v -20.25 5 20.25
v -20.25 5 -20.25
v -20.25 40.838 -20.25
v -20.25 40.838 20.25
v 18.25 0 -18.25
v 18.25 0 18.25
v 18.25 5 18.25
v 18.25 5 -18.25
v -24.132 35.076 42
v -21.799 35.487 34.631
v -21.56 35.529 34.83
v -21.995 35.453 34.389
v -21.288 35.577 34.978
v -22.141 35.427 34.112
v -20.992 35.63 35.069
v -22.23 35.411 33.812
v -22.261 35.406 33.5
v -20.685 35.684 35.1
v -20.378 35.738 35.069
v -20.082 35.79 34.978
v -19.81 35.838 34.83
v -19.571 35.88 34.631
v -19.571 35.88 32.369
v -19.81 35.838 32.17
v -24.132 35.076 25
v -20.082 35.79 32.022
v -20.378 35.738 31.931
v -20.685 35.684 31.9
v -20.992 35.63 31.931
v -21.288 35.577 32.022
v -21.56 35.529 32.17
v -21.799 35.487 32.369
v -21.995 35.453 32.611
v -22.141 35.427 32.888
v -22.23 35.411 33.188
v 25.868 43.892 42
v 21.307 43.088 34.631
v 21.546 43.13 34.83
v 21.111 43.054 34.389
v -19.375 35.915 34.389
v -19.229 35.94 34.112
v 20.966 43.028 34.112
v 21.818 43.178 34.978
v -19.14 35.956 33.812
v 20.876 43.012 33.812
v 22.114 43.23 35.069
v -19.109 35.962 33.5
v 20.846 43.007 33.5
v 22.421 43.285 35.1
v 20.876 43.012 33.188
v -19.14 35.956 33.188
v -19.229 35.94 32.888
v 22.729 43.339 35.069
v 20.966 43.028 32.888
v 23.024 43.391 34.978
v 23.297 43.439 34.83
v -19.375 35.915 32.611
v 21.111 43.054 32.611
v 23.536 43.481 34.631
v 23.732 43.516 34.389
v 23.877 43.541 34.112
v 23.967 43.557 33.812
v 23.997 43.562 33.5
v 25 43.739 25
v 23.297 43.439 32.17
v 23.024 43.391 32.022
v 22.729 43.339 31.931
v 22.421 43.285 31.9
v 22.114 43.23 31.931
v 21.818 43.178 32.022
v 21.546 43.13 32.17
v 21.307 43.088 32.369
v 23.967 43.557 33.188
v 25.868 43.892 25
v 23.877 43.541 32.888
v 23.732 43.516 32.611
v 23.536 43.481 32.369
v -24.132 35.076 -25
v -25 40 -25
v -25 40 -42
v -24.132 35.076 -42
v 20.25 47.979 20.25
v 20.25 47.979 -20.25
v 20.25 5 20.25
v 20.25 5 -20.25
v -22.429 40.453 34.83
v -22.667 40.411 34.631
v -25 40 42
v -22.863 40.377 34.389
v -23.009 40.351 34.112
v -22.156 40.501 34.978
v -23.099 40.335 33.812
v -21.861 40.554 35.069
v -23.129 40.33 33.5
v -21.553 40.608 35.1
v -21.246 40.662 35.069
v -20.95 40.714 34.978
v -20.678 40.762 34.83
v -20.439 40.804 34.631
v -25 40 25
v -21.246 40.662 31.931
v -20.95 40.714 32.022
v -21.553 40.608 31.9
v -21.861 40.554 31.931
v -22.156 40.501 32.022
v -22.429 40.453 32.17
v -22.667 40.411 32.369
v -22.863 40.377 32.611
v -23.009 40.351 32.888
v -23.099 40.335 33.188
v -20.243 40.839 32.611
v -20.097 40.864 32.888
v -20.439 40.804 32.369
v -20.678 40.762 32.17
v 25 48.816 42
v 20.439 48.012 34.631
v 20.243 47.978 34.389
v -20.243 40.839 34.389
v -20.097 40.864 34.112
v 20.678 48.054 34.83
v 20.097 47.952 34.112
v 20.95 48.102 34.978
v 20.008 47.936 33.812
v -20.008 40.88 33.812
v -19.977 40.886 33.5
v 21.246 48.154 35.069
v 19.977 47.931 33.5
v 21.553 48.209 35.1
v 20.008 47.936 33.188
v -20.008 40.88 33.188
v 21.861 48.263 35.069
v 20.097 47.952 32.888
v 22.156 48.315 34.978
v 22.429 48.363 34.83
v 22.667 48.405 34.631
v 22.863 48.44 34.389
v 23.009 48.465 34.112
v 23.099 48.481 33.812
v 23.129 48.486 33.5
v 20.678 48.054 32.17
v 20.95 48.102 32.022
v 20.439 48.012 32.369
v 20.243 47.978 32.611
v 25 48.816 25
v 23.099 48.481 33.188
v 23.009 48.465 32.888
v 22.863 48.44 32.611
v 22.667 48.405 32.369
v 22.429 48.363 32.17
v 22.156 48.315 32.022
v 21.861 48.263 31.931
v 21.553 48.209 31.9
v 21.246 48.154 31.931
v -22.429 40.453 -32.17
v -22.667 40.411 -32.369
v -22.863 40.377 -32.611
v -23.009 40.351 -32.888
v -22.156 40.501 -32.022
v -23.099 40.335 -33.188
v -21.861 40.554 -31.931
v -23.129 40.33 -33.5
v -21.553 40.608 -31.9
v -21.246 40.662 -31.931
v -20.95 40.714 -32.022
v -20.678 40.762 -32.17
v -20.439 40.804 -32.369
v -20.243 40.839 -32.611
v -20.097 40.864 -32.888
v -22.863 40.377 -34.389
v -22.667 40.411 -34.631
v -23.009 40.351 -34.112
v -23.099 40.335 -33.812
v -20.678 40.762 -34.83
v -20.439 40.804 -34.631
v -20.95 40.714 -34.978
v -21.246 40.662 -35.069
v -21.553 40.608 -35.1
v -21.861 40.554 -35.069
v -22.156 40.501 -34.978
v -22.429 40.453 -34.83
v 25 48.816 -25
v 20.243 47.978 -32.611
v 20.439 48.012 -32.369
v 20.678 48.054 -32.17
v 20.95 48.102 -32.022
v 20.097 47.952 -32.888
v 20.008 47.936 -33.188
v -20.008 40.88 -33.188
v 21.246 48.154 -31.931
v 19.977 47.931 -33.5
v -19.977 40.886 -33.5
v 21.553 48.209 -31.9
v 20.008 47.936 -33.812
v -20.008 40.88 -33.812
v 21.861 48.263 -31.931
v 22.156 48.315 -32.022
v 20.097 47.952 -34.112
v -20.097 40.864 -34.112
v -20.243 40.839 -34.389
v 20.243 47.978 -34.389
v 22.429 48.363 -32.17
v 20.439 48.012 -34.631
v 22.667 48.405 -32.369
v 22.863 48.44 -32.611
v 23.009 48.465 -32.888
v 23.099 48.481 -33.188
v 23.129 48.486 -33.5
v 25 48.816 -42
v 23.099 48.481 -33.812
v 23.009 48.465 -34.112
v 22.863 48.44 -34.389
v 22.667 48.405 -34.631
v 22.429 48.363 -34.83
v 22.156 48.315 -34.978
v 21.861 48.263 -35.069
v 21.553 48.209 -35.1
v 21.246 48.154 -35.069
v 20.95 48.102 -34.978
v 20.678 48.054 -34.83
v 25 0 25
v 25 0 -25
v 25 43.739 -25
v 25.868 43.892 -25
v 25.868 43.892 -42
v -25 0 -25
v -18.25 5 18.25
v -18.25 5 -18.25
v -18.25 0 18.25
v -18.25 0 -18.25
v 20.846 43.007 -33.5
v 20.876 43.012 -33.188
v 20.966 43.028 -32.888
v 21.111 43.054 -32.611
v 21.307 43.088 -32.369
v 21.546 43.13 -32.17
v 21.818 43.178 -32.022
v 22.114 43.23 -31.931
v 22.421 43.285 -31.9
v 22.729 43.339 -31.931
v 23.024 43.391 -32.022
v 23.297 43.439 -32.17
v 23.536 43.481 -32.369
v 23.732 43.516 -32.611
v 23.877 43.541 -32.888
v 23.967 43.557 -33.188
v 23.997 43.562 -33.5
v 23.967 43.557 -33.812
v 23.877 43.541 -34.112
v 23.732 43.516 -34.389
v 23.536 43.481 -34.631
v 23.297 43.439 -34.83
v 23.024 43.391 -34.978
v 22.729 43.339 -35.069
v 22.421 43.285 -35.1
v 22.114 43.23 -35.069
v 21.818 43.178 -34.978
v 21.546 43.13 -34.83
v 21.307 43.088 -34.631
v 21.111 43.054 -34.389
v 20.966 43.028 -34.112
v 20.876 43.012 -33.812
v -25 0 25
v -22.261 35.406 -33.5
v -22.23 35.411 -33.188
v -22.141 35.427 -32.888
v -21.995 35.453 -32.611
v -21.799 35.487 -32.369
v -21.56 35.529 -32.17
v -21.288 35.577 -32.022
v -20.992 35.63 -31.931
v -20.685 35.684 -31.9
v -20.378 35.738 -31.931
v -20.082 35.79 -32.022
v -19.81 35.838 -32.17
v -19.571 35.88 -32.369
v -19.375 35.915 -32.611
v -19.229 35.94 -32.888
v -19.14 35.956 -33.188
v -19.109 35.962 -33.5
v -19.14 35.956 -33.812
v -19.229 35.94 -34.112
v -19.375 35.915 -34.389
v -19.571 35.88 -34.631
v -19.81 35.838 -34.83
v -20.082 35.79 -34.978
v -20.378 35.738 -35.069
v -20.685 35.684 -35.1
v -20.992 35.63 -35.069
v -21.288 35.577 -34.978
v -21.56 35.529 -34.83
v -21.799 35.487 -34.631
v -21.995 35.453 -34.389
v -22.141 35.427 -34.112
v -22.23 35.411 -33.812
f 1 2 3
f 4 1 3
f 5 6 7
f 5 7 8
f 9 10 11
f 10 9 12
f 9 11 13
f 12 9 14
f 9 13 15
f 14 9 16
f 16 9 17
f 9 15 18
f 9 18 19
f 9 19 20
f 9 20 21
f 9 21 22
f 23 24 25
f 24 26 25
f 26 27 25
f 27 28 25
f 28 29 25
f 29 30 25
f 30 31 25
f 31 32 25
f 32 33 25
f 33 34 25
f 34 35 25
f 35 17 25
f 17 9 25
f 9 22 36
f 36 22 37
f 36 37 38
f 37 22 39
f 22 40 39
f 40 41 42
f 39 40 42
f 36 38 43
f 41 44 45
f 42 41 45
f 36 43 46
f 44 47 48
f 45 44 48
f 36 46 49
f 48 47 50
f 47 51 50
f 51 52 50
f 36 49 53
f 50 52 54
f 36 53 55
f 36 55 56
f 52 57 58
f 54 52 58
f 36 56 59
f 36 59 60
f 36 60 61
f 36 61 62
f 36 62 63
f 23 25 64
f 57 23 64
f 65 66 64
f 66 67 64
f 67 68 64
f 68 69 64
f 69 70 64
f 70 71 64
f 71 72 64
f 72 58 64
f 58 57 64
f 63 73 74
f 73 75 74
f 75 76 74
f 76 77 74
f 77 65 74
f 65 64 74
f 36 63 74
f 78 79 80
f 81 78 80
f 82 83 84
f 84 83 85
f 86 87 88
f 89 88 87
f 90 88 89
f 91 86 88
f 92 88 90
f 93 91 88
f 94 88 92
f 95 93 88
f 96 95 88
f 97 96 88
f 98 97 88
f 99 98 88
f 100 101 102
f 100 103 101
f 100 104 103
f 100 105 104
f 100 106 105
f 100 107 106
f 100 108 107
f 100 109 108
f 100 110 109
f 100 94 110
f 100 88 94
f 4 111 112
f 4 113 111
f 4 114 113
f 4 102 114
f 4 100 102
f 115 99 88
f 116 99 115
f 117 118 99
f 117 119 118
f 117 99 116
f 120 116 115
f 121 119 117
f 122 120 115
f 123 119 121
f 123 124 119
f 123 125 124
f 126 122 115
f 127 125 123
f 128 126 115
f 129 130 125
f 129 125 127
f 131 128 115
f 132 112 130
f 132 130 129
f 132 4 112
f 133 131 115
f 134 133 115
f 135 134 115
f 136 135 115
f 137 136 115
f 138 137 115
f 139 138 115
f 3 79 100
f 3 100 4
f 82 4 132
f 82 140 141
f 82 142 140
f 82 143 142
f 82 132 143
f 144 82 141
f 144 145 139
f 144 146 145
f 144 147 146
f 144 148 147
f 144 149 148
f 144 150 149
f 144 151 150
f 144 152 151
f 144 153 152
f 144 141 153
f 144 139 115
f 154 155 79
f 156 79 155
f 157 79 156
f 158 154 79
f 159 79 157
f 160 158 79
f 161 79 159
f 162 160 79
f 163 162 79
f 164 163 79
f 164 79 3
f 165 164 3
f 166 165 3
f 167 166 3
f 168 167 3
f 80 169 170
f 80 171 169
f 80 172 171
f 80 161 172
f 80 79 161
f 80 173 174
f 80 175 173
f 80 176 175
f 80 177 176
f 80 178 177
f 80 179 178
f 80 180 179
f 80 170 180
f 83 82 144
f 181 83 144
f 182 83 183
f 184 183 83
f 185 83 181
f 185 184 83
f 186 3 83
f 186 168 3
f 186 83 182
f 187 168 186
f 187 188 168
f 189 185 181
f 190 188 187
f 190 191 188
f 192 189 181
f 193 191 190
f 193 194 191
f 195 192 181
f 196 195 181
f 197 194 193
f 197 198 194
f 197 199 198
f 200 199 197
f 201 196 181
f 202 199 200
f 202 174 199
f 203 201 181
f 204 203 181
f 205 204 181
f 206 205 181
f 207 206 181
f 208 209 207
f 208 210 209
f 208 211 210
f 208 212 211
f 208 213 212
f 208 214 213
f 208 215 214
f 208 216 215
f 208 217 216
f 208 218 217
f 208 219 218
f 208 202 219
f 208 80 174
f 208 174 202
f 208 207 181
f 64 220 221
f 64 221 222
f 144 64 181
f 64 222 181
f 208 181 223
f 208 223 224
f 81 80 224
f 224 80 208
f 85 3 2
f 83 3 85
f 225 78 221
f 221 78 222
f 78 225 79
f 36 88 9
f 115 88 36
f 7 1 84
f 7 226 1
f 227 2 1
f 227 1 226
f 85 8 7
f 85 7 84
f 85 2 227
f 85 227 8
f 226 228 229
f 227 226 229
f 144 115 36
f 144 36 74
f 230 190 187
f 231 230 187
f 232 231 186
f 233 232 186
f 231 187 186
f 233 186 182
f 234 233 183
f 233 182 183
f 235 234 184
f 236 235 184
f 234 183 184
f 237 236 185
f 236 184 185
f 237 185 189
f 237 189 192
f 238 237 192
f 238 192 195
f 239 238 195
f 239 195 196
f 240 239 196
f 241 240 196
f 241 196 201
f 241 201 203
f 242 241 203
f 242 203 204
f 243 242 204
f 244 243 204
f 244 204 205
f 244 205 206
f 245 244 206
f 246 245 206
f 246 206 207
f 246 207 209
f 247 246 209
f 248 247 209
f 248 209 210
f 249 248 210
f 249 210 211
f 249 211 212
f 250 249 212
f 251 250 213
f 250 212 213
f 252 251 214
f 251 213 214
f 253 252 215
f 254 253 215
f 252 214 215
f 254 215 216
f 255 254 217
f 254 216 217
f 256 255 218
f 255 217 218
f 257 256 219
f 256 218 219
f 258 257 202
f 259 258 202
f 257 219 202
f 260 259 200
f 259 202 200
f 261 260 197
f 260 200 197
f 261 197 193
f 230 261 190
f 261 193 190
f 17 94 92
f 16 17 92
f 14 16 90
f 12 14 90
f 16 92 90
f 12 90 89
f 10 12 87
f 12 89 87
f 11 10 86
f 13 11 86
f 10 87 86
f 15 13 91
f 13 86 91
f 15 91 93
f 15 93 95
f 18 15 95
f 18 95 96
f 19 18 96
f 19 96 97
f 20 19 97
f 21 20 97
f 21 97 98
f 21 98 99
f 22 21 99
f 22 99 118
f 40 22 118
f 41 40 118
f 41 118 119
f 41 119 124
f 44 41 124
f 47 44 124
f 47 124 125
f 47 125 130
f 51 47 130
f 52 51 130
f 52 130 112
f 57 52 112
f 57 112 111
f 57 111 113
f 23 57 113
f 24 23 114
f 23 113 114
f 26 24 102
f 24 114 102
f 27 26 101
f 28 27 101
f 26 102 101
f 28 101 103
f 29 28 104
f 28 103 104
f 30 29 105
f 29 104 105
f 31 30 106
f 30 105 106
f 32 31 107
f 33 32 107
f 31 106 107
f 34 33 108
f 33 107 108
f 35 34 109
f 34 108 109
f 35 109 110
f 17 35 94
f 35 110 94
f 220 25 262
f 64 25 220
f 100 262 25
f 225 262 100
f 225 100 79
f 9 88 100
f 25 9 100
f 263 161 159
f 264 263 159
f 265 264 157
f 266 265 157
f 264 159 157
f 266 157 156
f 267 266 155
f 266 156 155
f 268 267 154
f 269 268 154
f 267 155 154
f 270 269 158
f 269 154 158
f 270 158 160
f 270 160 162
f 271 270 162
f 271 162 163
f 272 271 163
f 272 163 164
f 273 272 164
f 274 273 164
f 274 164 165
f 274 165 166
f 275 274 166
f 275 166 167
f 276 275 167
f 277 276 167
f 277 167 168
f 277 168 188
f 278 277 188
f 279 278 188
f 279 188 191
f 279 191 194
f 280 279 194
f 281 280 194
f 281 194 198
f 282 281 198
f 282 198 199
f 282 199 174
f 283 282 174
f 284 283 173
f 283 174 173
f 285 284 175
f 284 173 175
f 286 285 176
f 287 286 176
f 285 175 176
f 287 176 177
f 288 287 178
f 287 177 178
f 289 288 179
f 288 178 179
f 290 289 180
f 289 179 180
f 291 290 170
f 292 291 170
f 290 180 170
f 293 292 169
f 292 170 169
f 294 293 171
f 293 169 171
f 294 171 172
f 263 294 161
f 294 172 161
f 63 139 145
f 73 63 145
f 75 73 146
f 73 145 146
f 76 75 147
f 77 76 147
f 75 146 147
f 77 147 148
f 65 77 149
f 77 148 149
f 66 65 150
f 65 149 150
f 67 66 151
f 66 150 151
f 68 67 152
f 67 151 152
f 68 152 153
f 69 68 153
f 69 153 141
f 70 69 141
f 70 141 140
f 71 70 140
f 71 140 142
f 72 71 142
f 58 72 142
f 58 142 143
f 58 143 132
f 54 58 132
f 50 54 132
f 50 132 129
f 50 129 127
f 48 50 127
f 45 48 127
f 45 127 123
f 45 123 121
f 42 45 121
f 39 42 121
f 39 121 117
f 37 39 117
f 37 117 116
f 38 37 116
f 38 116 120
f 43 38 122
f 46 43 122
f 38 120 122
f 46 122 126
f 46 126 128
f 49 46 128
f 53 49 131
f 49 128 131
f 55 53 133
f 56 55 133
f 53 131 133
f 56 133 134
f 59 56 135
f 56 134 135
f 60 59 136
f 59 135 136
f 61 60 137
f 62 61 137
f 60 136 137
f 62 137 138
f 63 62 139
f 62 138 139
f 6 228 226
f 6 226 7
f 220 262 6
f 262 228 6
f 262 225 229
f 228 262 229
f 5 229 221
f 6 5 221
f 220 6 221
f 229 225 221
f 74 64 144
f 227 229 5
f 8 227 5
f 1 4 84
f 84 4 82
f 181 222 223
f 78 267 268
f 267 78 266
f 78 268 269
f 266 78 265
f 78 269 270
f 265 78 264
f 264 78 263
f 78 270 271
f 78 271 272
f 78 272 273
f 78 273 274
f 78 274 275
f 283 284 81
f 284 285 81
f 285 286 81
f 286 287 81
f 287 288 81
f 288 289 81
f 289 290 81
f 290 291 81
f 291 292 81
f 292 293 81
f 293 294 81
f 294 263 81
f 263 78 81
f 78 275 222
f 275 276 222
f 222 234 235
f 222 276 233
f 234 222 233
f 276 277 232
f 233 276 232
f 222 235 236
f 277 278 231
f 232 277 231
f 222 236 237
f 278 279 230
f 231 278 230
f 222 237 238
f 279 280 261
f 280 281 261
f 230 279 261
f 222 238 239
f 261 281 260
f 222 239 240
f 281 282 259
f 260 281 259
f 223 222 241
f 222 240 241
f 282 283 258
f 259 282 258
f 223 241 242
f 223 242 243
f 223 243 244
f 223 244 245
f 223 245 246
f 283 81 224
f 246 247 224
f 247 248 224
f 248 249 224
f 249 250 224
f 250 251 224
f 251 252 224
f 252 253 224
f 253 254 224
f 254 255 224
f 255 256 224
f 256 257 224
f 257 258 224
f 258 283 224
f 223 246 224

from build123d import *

# Parameters (mm, degrees)
SKETCH2_W             = 50
SKETCH2_H             = 50
SKETCH2_W_2           = 36.5
SKETCH2_H_2           = 36.5
BOSS_EXTRUDE2_DEPTH   = 5
SKETCH1_W             = 50
SKETCH1_H             = 50
SKETCH1_W_2           = 40.5
SKETCH1_H_2           = 40.5
BOSS_EXTRUDE4_DEPTH   = 40
BOSS_EXTRUDE5_START   = -25
BOSS_EXTRUDE5_DEPTH   = 50
BOSS_EXTRUDE5_2_DEPTH = 4.75
BOSS_EXTRUDE5_START_2 = 20.25
BOSS_EXTRUDE5_3_DEPTH = 4.75
SKETCH7_W             = 50.771330761
SKETCH7_H             = 17
BOSS_EXTRUDE6_DEPTH   = 5
SKETCH8_R             = 1.6
CUT_EXTRUDE1_DEPTH    = 13.5


# Read off the part's stored shape, not the designer's step: Boss-Extrude5
with BuildPart() as part:
    # Sketch2 → Boss-Extrude2 (new body)
    with BuildSketch(Plane(origin=(0, 0, 0), x_dir=(1, 0, 0), z_dir=(0, 1, 0))):
        Rectangle(SKETCH2_W, SKETCH2_H)
        Rectangle(SKETCH2_W_2, SKETCH2_H_2, mode=Mode.SUBTRACT)
    extrude(amount=BOSS_EXTRUDE2_DEPTH)

    # Sketch1 → Boss-Extrude4 (add)
    with BuildSketch(Plane(origin=(0, 0, 0), x_dir=(1, 0, 0), z_dir=(0, 1, 0))):
        Rectangle(SKETCH1_W, SKETCH1_H)
        Rectangle(SKETCH1_W_2, SKETCH1_H_2, mode=Mode.SUBTRACT)
    extrude(amount=BOSS_EXTRUDE4_DEPTH)

    # Boss-Extrude5 outline → Boss-Extrude5 (add)
    with BuildSketch(Plane.XY.offset(BOSS_EXTRUDE5_START)):
        Polygon((25, 40), (25, 48.81635), (20.25, 47.97879675), (20.25, 40), align=None)
        Polygon((-20.25, 40), (-20.25, 40.83755325), (-25, 40), align=None)
    extrude(amount=BOSS_EXTRUDE5_DEPTH)

    # Boss-Extrude5 2 outline → Boss-Extrude5 2 (add)
    with BuildSketch(Plane.XY.offset(BOSS_EXTRUDE5_START)):
        Polygon((20.25, 40), (20.25, 47.97879675), (-20.25, 40.83755325), (-20.25, 40), align=None)
    extrude(amount=BOSS_EXTRUDE5_2_DEPTH)

    # Boss-Extrude5 3 outline → Boss-Extrude5 3 (add)
    with BuildSketch(Plane.XY.offset(BOSS_EXTRUDE5_START_2)):
        Polygon((20.25, 40), (20.25, 47.97879675), (-20.25, 40.83755325), (-20.25, 40), align=None)
    extrude(amount=BOSS_EXTRUDE5_3_DEPTH)

    # Sketch7 → Boss-Extrude6 (add)
    with BuildSketch(Plane(origin=(-7.59424597, 43.069104391, 0), x_dir=(0.984807749763281, 0.17364819609251012, 0), z_dir=(-0.17364819609251012, 0.984807749763281, 0))):
        with Locations((7.71139948, 33.5)):
            Rectangle(SKETCH7_W, SKETCH7_H)
        with Locations((7.71139948, -33.5)):
            Rectangle(SKETCH7_W, SKETCH7_H)
    extrude(amount=-BOSS_EXTRUDE6_DEPTH)

    # Sketch8 → Cut-Extrude1 (cut)
    with BuildSketch(Plane(origin=(-7.59424597, 43.069104391, 0), x_dir=(0.984807749763281, 0.17364819609251012, 0), z_dir=(-0.17364819609251012, 0.984807749763281, 0))):
        with Locations(Location((-14.1742659, -33.5, 0), (0, 0, 180))):
            Circle(SKETCH8_R)
        with Locations((29.597064861, -33.5)):
            Circle(SKETCH8_R)
        with Locations(Location((29.597064861, 33.5, 0), (0, 0, 180))):
            Circle(SKETCH8_R)
        with Locations(Location((-14.1742659, 33.5, 0), (0, 0, 180))):
            Circle(SKETCH8_R)
    extrude(amount=-CUT_EXTRUDE1_DEPTH, mode=Mode.SUBTRACT)


solid = part.part
